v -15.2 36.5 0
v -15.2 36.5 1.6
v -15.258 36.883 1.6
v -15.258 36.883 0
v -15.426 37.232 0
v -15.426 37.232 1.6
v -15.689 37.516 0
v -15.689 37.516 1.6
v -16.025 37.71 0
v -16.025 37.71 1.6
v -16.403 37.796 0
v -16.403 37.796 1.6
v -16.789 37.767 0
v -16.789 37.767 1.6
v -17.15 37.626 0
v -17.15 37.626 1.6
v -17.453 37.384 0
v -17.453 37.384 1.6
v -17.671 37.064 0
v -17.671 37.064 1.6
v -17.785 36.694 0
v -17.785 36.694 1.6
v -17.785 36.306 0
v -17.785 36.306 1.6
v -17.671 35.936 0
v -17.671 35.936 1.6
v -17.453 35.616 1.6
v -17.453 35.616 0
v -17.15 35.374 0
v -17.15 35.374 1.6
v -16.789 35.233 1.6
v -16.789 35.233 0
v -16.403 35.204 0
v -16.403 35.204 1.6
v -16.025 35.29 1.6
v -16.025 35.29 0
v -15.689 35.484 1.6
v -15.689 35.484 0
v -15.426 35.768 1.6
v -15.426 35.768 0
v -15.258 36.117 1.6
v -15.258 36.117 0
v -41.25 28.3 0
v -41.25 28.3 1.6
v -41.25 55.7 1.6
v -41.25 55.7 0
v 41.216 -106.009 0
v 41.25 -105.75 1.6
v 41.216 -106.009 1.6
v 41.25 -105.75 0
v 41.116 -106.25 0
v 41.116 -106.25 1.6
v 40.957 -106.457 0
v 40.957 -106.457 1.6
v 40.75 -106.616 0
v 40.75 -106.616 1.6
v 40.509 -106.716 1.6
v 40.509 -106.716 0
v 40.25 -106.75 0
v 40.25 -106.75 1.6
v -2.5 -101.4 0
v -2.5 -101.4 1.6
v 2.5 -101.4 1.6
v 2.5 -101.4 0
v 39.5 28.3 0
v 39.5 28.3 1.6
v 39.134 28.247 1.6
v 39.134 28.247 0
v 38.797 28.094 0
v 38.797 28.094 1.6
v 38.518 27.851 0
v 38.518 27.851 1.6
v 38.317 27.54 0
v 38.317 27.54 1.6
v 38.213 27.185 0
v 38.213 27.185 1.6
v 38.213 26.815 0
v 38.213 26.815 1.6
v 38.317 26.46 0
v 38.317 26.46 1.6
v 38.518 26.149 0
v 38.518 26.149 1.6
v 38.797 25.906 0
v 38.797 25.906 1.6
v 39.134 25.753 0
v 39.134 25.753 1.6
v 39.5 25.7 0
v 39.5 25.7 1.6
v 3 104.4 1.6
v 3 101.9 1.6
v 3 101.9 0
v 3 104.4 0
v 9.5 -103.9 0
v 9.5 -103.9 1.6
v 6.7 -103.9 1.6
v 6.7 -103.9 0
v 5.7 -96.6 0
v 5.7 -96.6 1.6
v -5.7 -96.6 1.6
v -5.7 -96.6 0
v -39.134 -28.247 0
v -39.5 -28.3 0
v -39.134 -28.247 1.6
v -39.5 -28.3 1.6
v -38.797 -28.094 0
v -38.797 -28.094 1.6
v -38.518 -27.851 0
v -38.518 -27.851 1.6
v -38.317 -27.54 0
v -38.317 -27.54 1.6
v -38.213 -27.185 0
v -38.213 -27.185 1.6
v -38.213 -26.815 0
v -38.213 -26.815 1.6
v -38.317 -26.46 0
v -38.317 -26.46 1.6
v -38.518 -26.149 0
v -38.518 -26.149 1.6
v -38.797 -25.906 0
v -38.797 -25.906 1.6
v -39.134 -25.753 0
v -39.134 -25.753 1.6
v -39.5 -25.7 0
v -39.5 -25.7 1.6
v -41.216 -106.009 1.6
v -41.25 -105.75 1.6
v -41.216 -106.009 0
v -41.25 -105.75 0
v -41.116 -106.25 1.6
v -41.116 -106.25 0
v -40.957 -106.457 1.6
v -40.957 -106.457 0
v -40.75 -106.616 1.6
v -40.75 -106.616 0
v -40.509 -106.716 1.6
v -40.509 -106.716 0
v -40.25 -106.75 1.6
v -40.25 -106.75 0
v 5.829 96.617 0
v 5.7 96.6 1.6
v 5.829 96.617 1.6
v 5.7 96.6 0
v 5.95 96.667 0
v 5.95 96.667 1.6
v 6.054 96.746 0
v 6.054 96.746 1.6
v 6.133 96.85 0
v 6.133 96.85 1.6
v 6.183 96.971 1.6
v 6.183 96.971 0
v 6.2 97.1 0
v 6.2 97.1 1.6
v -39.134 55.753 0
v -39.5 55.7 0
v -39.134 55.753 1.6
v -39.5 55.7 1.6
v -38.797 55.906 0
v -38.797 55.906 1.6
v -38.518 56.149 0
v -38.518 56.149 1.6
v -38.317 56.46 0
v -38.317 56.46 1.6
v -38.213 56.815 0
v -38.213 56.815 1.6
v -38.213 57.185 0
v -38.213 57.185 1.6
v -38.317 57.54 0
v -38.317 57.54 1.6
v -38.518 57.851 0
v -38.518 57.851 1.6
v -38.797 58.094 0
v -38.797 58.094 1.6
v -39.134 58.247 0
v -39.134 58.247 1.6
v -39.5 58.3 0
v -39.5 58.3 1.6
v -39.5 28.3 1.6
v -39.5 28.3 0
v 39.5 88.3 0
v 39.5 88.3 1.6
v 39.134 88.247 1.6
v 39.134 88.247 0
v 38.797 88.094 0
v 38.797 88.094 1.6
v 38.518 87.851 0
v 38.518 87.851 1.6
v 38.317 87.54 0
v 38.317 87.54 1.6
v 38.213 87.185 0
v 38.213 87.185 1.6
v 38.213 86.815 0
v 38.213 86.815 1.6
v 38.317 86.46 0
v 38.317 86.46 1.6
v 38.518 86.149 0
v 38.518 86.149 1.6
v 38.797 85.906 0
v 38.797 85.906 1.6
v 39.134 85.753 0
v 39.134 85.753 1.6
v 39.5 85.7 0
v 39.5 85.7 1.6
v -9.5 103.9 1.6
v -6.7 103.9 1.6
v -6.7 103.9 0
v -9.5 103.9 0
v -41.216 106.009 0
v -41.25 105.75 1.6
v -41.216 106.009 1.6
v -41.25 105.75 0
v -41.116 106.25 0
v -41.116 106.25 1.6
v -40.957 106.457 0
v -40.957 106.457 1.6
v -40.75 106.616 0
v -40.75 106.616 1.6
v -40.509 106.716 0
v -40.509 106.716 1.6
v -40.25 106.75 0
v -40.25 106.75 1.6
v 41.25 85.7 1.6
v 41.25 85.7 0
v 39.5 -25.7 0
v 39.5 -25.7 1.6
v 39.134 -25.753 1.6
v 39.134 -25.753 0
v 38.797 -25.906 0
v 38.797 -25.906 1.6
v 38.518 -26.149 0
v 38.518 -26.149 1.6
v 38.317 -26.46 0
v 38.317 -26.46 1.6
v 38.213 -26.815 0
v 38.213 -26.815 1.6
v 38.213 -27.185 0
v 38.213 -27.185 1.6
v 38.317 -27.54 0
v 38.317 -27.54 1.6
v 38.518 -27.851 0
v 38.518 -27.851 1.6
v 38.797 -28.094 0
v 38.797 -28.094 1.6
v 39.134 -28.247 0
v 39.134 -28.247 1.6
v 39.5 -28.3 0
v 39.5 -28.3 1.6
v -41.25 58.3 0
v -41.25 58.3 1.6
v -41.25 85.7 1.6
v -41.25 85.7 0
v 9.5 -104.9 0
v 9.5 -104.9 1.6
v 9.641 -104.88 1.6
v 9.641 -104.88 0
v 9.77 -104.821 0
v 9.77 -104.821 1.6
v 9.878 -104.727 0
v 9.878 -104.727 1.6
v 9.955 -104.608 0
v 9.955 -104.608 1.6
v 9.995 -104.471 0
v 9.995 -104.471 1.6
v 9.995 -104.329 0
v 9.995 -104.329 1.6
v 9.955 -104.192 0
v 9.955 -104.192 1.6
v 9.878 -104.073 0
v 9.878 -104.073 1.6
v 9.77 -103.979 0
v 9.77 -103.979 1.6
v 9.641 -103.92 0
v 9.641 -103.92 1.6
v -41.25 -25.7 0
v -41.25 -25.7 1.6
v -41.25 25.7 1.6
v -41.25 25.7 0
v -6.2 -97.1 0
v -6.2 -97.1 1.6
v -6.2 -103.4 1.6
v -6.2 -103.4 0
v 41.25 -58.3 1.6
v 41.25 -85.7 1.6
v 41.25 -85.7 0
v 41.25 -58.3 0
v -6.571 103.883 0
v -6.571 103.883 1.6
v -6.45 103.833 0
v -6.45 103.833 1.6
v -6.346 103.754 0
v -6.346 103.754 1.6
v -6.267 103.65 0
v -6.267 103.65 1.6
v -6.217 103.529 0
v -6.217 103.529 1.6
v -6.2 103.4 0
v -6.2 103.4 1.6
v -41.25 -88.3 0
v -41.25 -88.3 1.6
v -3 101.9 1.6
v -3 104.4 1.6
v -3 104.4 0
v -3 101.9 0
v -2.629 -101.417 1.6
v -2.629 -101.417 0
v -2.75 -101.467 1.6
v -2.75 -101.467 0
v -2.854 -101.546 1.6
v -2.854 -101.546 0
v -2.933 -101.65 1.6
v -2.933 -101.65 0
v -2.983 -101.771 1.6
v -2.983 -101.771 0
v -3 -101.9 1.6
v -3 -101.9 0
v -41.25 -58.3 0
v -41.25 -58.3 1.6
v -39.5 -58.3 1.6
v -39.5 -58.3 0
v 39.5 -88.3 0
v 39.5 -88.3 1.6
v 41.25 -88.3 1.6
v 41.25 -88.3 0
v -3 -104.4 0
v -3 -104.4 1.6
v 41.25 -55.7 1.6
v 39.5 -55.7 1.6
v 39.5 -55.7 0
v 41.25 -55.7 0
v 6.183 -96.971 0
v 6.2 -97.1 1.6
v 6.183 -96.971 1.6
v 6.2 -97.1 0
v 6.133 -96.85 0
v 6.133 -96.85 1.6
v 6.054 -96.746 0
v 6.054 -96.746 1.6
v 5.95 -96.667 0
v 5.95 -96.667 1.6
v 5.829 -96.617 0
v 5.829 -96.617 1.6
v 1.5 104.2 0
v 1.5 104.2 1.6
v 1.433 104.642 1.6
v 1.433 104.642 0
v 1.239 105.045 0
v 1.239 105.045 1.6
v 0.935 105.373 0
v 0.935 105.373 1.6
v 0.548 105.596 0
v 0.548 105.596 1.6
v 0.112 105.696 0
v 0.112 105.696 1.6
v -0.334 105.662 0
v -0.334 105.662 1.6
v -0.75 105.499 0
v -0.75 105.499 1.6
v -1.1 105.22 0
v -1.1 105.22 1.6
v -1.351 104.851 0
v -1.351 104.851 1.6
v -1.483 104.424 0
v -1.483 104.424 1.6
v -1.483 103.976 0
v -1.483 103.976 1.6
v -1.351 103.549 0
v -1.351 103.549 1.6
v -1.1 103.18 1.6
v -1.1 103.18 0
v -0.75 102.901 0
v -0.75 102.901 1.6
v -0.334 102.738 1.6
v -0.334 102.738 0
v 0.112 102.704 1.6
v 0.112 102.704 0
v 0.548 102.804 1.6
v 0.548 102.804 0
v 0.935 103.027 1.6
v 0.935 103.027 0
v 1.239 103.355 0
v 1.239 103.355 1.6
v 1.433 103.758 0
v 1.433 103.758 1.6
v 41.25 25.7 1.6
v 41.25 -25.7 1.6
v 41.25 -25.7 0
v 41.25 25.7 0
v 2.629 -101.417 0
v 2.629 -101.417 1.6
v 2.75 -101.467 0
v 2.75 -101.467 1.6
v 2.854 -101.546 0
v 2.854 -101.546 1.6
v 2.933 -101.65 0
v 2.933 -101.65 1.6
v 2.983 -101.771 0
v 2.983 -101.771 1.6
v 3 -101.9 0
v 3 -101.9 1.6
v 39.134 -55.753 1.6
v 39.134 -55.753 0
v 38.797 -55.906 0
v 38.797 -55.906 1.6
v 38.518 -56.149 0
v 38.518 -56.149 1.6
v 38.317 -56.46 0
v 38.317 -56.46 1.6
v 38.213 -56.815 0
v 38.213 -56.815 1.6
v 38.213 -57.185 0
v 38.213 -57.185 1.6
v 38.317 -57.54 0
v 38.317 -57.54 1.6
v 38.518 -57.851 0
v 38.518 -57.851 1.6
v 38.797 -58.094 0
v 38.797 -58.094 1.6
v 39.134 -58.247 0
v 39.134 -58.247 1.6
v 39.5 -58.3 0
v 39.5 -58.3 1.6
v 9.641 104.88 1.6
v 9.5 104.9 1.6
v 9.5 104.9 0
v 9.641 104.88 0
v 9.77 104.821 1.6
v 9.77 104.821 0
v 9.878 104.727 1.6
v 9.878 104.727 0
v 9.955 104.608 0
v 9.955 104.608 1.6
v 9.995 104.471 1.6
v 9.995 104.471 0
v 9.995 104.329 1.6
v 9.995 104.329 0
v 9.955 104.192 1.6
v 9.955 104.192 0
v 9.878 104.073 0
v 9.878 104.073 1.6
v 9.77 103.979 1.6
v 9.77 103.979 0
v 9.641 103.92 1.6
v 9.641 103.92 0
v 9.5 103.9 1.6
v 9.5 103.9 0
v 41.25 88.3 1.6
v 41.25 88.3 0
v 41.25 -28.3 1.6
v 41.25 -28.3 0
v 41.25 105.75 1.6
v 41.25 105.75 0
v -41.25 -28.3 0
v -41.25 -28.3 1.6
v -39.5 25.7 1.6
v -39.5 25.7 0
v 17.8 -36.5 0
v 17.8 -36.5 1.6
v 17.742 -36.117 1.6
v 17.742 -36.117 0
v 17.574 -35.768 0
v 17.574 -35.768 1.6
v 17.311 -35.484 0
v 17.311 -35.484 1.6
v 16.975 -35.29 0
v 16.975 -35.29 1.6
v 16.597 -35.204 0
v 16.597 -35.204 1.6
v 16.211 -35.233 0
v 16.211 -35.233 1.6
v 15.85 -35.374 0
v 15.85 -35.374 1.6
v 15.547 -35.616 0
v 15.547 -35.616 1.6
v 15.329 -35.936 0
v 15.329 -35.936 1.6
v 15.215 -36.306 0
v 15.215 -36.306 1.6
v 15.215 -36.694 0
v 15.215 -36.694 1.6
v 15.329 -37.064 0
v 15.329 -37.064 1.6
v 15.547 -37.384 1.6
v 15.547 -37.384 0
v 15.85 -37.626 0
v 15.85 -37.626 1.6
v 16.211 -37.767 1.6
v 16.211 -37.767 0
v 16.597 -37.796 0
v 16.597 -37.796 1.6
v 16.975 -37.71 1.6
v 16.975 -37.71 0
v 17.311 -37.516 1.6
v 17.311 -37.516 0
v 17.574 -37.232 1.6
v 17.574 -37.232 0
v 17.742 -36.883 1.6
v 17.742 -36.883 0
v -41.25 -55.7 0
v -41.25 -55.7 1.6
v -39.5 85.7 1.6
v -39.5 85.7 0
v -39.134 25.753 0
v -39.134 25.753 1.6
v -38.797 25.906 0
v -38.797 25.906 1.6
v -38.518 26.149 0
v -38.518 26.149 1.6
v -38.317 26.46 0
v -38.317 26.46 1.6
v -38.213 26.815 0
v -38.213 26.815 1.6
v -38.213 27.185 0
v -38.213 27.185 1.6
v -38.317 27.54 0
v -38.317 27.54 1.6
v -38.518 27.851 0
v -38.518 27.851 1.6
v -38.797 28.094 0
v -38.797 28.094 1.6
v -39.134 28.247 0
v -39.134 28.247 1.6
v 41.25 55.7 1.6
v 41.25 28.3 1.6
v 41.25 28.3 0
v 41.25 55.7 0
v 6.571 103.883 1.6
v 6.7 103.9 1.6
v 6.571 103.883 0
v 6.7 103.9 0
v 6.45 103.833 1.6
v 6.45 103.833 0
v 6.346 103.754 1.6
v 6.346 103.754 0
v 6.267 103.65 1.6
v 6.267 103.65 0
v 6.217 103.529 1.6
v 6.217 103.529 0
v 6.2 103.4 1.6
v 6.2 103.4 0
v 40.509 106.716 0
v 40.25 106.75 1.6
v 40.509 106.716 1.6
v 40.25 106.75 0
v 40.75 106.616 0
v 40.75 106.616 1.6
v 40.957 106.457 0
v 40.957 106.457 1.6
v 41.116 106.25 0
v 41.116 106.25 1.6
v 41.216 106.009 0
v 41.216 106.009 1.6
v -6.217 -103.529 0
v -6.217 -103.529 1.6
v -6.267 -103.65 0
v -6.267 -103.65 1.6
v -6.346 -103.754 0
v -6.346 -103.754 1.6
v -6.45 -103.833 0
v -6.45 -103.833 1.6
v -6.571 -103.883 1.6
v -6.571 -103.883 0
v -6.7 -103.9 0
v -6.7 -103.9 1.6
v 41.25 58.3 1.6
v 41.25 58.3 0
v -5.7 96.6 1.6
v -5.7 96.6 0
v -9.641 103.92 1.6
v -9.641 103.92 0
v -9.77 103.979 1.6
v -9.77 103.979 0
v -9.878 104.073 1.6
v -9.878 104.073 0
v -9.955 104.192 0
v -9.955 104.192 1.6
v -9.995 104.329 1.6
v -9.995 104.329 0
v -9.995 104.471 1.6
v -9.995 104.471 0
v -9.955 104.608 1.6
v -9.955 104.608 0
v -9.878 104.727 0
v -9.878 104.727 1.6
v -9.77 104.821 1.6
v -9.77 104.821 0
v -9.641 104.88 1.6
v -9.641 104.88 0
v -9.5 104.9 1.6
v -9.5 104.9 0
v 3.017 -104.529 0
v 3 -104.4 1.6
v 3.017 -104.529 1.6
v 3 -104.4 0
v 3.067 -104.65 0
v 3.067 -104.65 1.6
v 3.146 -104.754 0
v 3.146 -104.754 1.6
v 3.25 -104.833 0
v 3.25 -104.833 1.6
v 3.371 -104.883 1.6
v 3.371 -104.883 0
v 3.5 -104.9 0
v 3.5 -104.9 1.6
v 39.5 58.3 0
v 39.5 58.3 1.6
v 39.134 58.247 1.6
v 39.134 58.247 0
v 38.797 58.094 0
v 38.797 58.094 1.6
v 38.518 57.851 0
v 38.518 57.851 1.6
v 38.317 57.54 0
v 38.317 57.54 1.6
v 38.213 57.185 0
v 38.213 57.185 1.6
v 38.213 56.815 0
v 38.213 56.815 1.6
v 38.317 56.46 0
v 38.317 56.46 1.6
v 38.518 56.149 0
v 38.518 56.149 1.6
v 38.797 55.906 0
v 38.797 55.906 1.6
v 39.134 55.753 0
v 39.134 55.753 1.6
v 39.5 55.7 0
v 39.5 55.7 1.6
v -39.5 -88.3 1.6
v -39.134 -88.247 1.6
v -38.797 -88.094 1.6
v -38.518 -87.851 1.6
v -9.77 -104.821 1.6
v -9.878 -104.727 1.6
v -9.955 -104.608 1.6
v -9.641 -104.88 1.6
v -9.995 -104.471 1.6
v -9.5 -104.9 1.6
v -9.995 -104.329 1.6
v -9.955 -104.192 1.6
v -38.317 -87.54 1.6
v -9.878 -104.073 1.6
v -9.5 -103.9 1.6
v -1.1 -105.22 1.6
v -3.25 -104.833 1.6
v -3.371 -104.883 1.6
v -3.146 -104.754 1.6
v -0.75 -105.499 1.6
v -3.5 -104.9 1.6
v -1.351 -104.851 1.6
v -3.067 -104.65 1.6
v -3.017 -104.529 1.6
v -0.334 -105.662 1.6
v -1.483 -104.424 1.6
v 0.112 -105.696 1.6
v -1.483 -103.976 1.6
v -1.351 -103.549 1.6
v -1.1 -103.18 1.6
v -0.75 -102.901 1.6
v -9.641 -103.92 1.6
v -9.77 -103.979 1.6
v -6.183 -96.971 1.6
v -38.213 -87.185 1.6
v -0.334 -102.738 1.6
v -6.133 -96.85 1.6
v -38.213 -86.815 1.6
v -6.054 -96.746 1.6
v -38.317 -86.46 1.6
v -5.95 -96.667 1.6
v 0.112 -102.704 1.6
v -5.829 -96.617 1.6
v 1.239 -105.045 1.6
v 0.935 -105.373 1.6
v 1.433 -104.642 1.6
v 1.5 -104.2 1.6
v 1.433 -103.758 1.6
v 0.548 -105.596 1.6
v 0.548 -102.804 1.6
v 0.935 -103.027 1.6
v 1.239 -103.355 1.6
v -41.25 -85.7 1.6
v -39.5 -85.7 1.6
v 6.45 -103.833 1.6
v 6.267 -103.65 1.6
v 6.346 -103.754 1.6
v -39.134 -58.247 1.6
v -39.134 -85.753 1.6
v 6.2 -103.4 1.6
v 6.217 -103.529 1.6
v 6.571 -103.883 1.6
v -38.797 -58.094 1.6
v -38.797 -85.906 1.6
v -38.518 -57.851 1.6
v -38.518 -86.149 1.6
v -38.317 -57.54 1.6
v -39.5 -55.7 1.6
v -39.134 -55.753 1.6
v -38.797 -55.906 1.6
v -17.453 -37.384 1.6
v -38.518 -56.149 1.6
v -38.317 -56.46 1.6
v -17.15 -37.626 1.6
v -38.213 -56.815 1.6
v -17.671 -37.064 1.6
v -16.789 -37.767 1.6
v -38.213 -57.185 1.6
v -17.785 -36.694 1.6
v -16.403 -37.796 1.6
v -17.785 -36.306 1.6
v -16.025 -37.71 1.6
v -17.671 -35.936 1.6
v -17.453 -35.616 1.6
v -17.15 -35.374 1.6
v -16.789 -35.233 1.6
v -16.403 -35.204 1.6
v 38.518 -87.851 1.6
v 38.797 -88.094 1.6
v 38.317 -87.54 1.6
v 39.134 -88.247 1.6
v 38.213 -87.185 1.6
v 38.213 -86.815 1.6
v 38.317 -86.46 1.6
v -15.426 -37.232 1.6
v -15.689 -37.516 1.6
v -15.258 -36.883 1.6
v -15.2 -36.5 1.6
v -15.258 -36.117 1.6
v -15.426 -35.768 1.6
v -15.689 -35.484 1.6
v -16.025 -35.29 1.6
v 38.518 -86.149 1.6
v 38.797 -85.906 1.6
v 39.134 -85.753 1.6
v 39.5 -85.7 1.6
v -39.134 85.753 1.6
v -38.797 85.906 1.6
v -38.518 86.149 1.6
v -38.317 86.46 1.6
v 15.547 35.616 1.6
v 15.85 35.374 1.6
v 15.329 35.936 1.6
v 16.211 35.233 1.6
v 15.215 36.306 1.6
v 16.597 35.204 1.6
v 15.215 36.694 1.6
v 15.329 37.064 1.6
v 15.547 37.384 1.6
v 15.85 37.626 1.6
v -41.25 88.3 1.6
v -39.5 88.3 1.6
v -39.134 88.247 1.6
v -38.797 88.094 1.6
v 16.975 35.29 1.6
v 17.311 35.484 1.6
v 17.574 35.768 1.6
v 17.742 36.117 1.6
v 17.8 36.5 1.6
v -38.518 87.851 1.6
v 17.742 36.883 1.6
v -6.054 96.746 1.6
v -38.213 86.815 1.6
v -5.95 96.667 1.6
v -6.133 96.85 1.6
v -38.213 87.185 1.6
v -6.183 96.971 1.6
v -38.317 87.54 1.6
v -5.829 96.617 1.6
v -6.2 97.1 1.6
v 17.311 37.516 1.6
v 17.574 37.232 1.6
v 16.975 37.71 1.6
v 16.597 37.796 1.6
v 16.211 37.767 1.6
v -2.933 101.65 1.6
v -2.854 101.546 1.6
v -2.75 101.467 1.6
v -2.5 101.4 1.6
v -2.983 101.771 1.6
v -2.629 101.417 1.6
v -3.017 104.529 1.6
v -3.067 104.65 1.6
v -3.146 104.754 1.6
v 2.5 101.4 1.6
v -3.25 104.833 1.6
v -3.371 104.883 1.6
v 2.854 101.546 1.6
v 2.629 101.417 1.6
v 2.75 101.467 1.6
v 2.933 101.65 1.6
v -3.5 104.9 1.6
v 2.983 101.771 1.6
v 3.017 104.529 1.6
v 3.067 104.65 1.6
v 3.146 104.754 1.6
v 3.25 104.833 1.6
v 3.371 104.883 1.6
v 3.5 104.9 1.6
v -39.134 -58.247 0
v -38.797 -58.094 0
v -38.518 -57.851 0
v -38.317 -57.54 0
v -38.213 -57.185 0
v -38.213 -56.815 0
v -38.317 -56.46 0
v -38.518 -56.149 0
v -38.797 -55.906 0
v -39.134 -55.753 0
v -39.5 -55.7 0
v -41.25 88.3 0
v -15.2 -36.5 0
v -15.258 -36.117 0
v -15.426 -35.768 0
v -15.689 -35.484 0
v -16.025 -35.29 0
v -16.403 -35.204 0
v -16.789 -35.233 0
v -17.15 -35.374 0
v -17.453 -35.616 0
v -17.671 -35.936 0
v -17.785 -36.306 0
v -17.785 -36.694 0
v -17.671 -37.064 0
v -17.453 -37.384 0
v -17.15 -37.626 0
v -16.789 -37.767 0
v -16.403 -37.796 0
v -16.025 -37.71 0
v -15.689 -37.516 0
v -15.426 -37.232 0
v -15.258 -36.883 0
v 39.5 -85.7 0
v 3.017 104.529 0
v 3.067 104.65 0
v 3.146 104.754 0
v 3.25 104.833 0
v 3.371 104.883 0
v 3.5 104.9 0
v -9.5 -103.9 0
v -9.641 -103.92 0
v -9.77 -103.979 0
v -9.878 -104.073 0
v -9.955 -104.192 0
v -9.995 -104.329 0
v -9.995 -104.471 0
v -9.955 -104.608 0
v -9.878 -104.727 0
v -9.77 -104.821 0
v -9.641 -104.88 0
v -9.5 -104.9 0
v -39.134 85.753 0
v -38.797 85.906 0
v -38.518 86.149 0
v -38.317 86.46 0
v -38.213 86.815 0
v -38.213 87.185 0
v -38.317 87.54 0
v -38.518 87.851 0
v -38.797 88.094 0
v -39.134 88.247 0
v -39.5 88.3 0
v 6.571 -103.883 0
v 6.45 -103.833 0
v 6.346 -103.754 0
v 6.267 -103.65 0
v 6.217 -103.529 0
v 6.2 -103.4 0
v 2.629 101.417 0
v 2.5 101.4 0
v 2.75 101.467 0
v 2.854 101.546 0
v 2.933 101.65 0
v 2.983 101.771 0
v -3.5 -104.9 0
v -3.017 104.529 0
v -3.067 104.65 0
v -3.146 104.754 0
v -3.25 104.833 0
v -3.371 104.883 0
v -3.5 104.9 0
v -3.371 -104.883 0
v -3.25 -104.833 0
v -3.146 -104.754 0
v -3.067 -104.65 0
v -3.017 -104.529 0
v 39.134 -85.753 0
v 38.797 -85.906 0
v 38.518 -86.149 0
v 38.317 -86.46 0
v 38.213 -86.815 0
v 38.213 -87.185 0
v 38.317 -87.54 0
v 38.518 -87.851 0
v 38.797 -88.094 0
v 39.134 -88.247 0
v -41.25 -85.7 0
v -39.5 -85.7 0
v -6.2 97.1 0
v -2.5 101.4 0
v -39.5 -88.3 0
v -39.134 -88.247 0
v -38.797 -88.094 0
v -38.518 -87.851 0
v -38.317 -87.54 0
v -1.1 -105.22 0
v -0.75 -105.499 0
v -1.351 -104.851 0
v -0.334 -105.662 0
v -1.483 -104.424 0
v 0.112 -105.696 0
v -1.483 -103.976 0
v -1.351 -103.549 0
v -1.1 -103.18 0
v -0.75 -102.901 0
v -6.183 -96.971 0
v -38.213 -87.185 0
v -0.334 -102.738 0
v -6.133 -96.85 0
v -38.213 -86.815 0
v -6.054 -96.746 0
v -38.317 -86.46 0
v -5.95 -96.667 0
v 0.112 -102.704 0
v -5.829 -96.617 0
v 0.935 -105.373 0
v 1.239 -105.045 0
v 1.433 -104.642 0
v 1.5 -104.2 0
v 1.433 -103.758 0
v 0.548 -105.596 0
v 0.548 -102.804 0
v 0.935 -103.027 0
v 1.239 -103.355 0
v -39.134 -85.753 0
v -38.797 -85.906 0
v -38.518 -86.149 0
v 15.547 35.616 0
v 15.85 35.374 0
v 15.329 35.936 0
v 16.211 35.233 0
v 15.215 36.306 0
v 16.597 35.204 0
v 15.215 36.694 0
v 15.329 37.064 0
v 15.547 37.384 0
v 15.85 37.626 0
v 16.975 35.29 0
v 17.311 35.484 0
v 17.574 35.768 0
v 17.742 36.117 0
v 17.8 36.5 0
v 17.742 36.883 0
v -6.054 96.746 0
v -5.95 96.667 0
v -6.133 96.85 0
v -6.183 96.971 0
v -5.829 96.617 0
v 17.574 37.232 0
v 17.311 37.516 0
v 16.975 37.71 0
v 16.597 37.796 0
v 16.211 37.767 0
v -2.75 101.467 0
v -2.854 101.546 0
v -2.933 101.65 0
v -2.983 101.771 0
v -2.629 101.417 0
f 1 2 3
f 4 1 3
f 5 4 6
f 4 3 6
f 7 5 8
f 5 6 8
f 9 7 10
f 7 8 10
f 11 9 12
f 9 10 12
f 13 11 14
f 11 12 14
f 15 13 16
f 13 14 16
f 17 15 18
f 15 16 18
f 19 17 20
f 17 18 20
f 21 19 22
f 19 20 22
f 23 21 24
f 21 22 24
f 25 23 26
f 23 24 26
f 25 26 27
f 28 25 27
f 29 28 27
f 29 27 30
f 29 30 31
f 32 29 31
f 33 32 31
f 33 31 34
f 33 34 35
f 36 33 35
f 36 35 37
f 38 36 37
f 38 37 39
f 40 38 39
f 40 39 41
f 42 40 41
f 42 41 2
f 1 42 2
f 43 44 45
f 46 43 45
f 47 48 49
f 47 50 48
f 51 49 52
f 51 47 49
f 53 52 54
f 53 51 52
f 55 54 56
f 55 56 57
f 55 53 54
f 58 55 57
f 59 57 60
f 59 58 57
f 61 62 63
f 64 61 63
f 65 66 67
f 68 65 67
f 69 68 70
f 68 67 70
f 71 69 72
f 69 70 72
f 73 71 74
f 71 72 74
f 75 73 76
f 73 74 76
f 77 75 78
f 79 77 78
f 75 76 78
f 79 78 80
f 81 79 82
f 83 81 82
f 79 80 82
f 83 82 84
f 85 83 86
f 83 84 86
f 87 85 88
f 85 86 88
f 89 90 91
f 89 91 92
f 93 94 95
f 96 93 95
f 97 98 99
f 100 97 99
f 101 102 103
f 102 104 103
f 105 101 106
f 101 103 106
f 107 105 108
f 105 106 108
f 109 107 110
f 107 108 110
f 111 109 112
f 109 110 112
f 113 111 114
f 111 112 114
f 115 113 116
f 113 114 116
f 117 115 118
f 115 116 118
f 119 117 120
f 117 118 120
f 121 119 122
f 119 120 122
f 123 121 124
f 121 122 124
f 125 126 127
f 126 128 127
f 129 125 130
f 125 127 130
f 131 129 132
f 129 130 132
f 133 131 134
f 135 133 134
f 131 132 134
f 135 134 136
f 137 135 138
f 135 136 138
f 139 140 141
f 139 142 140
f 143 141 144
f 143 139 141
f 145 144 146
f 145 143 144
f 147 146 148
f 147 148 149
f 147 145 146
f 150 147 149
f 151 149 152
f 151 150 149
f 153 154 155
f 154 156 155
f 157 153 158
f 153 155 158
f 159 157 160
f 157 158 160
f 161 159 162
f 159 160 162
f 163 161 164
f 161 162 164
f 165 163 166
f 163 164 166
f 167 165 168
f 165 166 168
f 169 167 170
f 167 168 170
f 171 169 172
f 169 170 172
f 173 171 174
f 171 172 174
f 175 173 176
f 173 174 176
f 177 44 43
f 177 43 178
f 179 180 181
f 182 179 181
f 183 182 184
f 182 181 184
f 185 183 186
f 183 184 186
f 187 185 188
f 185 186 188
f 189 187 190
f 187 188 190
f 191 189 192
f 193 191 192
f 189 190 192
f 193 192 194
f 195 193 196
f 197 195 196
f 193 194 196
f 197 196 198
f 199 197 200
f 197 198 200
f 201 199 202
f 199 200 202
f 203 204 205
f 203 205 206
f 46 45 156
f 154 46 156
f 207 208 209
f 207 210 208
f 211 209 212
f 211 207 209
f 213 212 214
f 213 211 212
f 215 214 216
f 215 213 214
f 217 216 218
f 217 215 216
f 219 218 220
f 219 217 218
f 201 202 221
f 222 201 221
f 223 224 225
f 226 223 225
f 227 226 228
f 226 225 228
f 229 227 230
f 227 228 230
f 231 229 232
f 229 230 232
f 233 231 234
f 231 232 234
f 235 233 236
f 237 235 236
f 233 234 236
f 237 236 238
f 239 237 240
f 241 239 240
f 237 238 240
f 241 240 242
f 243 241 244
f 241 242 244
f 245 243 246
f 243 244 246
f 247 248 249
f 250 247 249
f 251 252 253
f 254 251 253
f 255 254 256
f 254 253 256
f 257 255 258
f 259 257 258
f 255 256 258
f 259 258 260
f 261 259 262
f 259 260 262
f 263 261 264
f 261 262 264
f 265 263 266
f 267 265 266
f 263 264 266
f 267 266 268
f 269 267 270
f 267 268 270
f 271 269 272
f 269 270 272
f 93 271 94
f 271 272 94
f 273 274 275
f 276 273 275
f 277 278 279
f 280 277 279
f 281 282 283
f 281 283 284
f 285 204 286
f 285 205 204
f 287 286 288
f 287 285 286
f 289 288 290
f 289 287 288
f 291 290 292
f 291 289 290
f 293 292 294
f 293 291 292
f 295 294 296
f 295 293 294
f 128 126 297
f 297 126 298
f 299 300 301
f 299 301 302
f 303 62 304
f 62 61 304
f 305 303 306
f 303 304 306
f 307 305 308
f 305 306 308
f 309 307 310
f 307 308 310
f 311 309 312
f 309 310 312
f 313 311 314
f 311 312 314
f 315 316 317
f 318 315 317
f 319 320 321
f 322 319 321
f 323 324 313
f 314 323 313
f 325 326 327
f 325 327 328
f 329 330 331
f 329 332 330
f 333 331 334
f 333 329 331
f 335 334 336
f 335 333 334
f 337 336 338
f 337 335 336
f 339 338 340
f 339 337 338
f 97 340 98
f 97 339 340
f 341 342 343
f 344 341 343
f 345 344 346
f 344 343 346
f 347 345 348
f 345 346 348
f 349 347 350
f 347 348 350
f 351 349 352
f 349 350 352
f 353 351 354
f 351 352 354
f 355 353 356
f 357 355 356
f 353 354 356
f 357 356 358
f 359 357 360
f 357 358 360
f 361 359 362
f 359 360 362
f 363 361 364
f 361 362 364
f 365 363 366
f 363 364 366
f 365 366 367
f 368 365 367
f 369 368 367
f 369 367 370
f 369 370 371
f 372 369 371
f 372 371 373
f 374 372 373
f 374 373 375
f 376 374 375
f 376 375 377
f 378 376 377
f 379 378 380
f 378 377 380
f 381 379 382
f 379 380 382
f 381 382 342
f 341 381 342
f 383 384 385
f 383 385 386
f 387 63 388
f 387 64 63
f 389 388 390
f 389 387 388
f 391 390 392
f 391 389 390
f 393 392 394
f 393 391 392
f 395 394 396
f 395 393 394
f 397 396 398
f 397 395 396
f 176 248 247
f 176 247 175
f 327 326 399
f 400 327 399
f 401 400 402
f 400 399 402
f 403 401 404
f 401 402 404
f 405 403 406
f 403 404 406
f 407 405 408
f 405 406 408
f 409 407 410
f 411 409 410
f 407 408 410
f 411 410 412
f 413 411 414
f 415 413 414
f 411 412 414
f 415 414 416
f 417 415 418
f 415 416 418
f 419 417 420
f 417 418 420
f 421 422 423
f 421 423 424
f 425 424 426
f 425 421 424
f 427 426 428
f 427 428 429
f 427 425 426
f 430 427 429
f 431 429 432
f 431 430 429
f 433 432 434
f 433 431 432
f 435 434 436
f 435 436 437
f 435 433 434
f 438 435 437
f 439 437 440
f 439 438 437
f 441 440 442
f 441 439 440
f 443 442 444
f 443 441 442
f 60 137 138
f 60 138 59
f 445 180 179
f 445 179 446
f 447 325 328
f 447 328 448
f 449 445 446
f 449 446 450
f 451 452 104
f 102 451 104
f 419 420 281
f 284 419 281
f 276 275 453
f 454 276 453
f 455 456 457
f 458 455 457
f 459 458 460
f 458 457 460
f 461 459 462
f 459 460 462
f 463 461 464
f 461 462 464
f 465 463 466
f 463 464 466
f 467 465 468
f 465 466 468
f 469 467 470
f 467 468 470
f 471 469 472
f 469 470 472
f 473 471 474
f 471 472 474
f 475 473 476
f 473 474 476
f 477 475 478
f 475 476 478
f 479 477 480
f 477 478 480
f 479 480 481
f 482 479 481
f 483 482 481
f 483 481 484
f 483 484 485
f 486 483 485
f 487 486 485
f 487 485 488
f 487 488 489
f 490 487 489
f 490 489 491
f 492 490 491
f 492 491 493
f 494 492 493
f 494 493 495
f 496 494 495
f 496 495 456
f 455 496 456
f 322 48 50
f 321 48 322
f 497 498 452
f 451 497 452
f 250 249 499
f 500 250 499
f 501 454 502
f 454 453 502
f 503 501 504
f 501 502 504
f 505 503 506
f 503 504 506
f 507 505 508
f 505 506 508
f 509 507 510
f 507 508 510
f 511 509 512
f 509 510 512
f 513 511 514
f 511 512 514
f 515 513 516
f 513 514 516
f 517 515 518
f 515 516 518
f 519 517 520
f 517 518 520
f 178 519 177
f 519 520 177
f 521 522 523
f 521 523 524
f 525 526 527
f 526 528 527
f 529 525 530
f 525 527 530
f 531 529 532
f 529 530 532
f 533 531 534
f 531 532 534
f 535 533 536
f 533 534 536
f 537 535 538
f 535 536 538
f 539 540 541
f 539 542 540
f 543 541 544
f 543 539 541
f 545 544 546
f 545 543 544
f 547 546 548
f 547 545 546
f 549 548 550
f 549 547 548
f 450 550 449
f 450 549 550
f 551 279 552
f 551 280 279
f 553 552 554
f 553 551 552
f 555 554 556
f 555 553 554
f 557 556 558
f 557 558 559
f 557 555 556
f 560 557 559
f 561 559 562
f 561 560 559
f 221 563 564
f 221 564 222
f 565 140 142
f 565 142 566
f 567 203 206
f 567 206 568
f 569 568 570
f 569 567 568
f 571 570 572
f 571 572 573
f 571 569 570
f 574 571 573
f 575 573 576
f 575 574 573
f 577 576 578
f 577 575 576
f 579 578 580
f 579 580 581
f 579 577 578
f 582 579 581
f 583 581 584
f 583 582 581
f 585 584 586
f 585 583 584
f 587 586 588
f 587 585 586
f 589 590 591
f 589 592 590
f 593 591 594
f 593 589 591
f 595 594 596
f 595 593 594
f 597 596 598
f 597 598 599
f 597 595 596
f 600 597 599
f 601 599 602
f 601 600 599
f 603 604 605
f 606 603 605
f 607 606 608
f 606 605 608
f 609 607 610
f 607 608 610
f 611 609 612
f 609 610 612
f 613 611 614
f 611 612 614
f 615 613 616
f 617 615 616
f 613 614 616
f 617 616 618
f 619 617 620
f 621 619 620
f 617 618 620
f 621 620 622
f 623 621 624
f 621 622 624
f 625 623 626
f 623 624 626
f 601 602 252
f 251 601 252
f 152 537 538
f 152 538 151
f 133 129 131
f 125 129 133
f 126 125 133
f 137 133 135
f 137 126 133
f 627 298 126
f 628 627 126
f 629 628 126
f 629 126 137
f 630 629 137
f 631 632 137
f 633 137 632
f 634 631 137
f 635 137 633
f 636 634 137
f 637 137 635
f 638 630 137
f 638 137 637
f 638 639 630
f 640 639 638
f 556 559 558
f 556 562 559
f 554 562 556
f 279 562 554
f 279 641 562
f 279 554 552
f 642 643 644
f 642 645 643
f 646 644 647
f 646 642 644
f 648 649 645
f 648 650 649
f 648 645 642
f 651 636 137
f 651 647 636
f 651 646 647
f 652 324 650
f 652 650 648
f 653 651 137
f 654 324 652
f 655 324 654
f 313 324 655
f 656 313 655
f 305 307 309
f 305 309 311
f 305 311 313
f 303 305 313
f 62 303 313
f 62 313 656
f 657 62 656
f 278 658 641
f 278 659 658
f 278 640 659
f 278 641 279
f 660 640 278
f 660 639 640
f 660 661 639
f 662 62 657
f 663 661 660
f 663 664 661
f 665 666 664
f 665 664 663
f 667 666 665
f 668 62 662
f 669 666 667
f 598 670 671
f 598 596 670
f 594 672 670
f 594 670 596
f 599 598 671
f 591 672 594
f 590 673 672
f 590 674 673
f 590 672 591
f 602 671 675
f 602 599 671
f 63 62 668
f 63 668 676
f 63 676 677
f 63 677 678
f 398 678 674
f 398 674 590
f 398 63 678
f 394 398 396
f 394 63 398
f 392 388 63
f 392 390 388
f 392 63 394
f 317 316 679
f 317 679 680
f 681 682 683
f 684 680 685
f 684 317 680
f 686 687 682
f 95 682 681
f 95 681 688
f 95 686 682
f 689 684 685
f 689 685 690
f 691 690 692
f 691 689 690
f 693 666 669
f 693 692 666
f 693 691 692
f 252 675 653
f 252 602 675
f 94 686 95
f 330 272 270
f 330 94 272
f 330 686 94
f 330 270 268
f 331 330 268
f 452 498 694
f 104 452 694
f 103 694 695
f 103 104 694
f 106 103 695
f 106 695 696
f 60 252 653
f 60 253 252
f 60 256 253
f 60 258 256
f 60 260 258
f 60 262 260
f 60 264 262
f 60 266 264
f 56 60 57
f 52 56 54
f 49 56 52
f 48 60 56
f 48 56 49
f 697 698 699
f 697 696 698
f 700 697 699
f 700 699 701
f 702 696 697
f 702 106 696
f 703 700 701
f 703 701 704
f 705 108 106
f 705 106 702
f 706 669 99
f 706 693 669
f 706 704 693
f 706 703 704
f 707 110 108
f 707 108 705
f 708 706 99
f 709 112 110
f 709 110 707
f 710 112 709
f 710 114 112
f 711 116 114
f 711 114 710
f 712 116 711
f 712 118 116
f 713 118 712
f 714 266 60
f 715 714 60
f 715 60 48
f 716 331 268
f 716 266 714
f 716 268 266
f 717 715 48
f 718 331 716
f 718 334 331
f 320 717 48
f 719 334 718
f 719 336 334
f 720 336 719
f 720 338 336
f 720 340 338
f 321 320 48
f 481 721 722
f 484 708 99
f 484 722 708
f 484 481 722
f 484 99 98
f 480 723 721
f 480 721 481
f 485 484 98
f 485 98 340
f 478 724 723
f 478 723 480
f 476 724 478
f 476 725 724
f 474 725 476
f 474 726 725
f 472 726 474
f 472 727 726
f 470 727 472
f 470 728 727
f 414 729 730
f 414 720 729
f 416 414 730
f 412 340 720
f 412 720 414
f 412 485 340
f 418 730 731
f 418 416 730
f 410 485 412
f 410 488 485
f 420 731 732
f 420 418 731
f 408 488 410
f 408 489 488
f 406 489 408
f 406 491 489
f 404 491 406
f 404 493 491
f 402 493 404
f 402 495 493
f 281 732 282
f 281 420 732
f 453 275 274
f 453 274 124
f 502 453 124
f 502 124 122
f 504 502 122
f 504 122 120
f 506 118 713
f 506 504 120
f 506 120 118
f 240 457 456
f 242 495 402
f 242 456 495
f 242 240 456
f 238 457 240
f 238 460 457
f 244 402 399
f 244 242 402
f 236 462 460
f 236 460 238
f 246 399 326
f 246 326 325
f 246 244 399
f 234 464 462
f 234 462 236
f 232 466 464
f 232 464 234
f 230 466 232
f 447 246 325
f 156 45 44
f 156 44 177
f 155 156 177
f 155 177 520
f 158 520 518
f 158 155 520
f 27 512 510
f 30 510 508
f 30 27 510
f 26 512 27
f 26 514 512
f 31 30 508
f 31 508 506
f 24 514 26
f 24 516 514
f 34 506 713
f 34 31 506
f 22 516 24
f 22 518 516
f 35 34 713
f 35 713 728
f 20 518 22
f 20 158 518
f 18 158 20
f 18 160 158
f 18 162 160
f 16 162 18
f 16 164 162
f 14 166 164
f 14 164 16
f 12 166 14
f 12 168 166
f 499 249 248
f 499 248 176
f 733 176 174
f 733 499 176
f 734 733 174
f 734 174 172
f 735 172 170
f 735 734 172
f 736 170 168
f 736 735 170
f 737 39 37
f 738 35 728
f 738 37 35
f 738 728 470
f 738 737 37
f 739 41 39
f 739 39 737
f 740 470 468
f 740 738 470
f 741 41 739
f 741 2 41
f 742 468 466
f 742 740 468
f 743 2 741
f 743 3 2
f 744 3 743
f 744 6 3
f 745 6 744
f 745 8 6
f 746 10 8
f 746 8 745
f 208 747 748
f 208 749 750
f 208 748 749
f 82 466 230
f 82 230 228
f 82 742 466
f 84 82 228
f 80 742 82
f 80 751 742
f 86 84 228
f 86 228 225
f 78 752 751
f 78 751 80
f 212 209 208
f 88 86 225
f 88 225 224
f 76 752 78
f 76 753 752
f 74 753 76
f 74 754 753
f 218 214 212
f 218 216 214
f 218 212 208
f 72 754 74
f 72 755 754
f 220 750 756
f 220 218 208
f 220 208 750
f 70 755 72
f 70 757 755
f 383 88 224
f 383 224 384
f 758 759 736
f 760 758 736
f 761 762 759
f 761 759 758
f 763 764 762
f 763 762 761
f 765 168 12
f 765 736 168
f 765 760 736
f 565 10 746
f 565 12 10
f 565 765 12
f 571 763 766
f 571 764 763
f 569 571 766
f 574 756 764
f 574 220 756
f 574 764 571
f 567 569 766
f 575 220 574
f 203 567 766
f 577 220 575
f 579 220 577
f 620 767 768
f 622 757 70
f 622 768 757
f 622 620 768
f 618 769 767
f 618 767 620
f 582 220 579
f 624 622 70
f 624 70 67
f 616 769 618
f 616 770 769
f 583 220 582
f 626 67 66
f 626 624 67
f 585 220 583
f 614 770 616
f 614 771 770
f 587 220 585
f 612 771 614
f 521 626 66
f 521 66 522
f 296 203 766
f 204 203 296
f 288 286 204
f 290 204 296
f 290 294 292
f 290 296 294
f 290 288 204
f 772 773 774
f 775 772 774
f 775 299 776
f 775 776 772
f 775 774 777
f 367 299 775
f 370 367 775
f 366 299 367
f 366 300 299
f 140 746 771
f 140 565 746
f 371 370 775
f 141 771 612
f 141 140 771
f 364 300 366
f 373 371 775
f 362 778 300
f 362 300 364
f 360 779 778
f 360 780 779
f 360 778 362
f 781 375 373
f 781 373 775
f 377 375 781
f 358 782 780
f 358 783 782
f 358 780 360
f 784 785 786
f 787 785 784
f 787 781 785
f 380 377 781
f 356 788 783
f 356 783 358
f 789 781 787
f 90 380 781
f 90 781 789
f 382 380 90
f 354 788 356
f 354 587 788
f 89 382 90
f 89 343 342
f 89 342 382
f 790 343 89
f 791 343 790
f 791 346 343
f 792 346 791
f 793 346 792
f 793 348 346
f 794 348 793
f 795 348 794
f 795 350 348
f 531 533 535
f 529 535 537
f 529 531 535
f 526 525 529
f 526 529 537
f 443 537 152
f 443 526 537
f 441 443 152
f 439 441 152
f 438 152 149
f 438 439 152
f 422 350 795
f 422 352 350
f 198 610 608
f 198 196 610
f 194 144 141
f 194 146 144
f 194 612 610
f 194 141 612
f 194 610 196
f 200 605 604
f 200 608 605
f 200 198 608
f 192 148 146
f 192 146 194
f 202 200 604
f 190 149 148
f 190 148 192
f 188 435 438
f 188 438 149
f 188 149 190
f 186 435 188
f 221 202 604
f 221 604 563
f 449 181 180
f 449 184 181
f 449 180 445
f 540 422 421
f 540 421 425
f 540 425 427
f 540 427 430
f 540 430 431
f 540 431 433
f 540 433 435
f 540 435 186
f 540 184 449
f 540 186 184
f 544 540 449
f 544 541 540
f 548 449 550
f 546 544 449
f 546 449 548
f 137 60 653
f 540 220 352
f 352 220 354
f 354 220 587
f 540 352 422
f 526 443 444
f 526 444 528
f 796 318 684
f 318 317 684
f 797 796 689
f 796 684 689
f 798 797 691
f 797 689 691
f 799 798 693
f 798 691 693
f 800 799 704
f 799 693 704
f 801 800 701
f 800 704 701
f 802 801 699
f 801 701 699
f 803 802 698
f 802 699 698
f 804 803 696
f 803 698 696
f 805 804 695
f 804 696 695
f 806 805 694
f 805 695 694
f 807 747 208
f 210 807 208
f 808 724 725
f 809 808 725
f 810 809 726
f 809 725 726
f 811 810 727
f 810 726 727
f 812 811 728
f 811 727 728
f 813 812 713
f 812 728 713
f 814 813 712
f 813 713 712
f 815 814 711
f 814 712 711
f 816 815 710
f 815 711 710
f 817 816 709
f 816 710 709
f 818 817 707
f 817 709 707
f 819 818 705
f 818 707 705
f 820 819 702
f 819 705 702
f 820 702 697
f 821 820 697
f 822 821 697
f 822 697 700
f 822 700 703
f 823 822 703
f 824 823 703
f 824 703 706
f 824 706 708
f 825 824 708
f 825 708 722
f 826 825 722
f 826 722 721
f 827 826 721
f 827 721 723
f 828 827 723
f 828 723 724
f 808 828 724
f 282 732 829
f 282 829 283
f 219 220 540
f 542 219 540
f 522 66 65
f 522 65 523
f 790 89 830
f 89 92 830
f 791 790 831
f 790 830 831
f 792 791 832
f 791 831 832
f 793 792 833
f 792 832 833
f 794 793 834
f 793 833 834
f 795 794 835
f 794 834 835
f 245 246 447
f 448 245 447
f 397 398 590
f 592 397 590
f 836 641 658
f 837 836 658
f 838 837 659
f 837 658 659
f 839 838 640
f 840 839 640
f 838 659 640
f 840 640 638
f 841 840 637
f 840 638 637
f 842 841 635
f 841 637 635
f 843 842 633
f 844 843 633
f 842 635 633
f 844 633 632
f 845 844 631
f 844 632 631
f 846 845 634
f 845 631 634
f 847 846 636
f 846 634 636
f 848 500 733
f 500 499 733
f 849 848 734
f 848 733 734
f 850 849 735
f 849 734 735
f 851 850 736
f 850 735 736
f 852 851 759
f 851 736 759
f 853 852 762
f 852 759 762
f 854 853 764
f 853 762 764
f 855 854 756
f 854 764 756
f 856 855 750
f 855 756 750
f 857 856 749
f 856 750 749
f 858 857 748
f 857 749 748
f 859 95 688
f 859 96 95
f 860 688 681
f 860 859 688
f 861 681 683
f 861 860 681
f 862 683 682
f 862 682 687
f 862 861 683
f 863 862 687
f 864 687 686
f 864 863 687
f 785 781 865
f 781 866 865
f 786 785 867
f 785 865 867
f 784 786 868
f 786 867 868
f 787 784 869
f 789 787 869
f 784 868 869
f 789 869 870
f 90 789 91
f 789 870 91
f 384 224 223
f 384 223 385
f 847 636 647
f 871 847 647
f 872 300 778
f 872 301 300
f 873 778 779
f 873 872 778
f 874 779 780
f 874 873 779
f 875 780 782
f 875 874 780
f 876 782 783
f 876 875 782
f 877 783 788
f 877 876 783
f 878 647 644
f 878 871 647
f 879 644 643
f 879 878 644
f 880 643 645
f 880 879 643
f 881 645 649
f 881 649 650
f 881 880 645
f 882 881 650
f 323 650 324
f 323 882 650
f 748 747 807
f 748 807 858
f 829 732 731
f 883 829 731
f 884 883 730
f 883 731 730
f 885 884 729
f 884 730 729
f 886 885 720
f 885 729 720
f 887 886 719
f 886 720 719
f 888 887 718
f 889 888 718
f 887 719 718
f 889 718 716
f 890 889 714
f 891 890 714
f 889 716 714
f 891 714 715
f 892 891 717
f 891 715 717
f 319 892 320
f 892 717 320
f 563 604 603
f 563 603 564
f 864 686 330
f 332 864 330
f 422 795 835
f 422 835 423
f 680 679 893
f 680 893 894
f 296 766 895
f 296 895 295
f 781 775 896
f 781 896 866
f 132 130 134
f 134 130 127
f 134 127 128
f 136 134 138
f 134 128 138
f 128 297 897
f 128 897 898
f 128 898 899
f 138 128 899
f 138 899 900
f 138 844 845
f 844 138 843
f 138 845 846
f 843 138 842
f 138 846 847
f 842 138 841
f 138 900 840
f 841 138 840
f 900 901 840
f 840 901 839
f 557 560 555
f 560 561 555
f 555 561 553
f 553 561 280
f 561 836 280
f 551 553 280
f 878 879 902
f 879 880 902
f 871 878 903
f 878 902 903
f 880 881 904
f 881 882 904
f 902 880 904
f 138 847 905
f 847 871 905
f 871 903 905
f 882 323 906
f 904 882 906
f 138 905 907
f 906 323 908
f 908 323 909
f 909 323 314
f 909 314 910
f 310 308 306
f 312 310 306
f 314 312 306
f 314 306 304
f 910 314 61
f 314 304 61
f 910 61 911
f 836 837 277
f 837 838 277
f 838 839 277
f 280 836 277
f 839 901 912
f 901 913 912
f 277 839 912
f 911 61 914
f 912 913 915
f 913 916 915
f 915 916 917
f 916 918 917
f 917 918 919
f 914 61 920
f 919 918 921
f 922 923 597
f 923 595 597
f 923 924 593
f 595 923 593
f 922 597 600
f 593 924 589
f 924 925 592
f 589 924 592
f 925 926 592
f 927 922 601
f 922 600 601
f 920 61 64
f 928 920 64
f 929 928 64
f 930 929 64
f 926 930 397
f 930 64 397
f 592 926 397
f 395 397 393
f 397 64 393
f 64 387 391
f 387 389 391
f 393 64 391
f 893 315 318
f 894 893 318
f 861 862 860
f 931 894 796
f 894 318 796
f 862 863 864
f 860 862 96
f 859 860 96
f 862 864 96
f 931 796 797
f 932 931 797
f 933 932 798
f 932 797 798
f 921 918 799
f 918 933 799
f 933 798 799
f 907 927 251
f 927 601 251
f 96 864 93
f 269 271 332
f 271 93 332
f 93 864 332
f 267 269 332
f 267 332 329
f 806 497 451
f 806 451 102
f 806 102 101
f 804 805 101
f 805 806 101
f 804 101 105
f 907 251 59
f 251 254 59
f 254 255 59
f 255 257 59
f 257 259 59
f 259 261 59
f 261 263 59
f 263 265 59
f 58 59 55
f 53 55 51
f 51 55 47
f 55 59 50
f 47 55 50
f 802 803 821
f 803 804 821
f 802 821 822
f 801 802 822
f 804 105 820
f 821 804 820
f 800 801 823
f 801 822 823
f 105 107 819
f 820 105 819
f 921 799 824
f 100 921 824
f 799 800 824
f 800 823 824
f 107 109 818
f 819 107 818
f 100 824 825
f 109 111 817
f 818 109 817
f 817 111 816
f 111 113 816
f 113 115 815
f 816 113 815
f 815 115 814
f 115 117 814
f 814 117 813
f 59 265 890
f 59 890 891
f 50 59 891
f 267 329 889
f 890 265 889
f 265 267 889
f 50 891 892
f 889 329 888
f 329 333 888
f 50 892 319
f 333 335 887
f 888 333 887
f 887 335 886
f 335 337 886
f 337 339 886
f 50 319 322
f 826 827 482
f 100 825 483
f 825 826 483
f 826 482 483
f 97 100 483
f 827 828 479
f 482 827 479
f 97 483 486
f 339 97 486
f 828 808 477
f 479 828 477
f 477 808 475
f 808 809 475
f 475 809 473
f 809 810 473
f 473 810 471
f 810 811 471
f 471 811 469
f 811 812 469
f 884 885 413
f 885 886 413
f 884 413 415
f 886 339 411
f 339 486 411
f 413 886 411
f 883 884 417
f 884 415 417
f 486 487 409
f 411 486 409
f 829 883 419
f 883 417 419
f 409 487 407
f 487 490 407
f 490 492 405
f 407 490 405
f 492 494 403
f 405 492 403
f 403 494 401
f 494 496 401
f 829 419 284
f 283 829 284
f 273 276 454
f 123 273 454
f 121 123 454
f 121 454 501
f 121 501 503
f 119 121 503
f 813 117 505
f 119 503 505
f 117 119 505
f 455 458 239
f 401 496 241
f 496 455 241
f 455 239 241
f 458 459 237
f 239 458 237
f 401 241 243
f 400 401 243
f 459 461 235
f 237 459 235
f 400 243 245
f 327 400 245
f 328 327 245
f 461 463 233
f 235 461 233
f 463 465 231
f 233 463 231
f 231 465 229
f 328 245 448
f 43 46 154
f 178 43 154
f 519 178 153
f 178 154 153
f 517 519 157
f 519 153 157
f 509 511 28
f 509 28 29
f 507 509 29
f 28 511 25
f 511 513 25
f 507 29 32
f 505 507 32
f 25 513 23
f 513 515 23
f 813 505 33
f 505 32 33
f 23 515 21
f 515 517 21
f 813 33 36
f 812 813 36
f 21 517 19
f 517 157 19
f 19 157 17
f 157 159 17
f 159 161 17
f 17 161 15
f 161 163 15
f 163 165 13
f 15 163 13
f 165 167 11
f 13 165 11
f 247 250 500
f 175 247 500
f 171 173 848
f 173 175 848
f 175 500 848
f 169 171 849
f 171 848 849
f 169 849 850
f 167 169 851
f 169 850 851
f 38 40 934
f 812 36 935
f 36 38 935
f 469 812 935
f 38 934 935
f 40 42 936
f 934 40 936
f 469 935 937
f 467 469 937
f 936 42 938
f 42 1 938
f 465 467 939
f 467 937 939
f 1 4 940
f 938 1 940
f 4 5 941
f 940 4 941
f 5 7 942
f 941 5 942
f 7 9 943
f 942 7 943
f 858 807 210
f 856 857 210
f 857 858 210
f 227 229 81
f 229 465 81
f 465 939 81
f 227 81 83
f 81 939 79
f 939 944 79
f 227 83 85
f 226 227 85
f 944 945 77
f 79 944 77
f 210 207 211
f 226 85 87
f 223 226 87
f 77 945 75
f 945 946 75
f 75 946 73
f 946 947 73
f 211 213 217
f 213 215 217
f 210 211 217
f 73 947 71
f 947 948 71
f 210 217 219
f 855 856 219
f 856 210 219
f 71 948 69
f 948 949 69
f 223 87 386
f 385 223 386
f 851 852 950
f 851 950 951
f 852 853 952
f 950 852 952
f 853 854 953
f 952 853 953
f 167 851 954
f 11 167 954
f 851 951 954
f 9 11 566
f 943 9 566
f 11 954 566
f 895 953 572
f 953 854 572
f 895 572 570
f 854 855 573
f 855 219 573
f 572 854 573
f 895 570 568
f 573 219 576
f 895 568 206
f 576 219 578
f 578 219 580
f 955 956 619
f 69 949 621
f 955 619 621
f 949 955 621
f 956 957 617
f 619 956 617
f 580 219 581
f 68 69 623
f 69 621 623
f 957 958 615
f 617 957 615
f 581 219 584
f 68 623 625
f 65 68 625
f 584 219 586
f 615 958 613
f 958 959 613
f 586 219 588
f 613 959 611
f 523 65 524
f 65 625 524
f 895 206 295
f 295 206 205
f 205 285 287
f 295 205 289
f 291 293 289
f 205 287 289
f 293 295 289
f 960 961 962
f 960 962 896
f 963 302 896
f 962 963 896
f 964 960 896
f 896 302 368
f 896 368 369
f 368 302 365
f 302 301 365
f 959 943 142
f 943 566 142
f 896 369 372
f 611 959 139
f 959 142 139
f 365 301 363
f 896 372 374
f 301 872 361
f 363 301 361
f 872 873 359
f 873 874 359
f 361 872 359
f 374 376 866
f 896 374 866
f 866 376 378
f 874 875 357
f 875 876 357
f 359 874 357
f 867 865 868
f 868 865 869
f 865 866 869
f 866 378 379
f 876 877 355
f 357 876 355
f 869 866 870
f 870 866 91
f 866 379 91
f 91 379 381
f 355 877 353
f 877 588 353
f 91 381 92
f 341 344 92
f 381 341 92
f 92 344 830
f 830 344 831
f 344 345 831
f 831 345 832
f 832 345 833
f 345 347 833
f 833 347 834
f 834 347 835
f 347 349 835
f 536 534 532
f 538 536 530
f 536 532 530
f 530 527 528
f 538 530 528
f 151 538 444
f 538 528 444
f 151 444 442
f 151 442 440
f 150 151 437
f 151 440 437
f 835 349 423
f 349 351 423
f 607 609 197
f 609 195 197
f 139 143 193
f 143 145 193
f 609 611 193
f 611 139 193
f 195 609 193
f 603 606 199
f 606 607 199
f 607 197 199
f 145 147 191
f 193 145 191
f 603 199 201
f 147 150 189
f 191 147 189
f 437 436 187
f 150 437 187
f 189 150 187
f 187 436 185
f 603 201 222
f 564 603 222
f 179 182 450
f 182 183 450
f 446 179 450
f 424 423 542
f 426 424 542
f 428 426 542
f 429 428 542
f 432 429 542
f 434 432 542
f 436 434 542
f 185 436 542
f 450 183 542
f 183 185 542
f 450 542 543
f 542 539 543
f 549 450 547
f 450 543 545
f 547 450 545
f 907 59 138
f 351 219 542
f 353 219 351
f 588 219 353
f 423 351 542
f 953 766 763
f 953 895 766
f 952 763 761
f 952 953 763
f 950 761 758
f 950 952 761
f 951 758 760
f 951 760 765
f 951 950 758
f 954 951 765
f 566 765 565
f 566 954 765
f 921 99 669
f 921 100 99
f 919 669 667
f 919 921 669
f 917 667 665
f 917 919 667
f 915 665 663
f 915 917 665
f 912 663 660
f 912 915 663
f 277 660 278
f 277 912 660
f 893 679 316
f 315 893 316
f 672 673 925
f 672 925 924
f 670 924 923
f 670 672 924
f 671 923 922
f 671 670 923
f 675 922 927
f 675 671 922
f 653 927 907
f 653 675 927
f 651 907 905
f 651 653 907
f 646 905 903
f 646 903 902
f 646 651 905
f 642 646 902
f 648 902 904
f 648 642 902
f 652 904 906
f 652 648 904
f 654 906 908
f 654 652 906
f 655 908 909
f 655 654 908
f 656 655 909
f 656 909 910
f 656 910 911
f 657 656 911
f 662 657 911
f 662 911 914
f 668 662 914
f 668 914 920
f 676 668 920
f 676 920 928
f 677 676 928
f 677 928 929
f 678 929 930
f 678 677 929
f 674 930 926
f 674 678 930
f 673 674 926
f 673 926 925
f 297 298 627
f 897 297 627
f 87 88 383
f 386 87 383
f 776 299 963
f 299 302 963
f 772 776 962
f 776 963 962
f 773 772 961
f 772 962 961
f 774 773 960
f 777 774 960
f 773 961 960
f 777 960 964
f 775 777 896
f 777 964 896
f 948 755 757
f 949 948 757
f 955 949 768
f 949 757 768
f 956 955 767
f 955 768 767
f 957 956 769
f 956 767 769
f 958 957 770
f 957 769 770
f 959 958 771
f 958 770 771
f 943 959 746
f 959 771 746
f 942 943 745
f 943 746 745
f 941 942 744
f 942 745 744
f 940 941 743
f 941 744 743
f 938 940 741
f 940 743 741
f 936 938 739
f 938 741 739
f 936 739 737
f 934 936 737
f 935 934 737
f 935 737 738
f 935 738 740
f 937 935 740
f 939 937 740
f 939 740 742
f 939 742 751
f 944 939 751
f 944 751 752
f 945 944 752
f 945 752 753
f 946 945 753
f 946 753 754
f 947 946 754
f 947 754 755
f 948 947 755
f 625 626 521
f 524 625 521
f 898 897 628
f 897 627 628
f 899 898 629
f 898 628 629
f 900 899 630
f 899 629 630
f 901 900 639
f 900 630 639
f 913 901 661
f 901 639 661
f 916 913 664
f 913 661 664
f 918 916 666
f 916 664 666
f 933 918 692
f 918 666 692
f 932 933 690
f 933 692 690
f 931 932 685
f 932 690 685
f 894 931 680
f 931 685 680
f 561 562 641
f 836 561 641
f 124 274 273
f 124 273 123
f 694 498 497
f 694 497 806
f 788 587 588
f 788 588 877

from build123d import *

# Parameters (mm, degrees)
SKETCH1_W                  = 82.8
SKETCH1_H                  = 213.8
SKETCH1_R                  = 0.8
PCB_EXTRUDE_DEPTH          = 1.6
SKETCH7_W                  = 82.5
SKETCH7_H                  = 213.5
OFFSET_EDGES_DEPTH         = 1.6
CORNER_FILLETS_ON_PCB_R    = 1
SKETCH3_R                  = 1.5
SOLAR_HOLE_DEPTH           = 1.6
FILLETS_FOR_SOLAR_HOLE_R   = 0.5
M2_CLEARANCE_HOLE1_D       = 2.6
SKETCH6_W                  = 1.75
SKETCH6_H                  = 2.6
SLOTS_FOR_EDGE_HOLES_DEPTH = 1.6


with BuildPart() as part:
    # Sketch1 → pcb extrude (new body)
    with BuildSketch(Plane.XY):
        Rectangle(SKETCH1_W, SKETCH1_H)
        with Locations((-39.5, -27)):
            Circle(SKETCH1_R, mode=Mode.SUBTRACT)
        with Locations((39.5, -27)):
            Circle(SKETCH1_R, mode=Mode.SUBTRACT)
        with Locations((-39.5, 87)):
            Circle(SKETCH1_R, mode=Mode.SUBTRACT)
        with Locations((-39.5, 57)):
            Circle(SKETCH1_R, mode=Mode.SUBTRACT)
        with Locations((-39.5, 27)):
            Circle(SKETCH1_R, mode=Mode.SUBTRACT)
        with Locations((-16.5, 36.5)):
            Circle(SKETCH1_R, mode=Mode.SUBTRACT)
        with Locations((-16.5, -36.5)):
            Circle(SKETCH1_R, mode=Mode.SUBTRACT)
        with Locations((-39.5, -57)):
            Circle(SKETCH1_R, mode=Mode.SUBTRACT)
        with Locations((-39.5, -87)):
            Circle(SKETCH1_R, mode=Mode.SUBTRACT)
        with Locations((0, -104.2)):
            Circle(SKETCH1_R, mode=Mode.SUBTRACT)
        with Locations((39.5, -87)):
            Circle(SKETCH1_R, mode=Mode.SUBTRACT)
        with Locations((39.5, -57)):
            Circle(SKETCH1_R, mode=Mode.SUBTRACT)
        with Locations((16.5, -36.5)):
            Circle(SKETCH1_R, mode=Mode.SUBTRACT)
        with Locations((39.5, 27)):
            Circle(SKETCH1_R, mode=Mode.SUBTRACT)
        with Locations((16.5, 36.5)):
            Circle(SKETCH1_R, mode=Mode.SUBTRACT)
        with Locations((39.5, 57)):
            Circle(SKETCH1_R, mode=Mode.SUBTRACT)
        with Locations((39.5, 87)):
            Circle(SKETCH1_R, mode=Mode.SUBTRACT)
        with Locations((0, 104.2)):
            Circle(SKETCH1_R, mode=Mode.SUBTRACT)
    extrude(amount=PCB_EXTRUDE_DEPTH)

    # Sketch7 → Offset Edges (cut)
    with BuildSketch(Plane.XY.offset(1.6)):
        Polygon((-41.25, 106.9), (-41.4, 106.9), (-41.4, -106.9), (-41.25, -106.9), (41.25, -106.9), (41.4, -106.9), (41.4, 106.9), (41.25, 106.9), align=None)
        Rectangle(SKETCH7_W, SKETCH7_H, mode=Mode.SUBTRACT)
    extrude(amount=-OFFSET_EDGES_DEPTH, mode=Mode.SUBTRACT)

    # corner fillets on PCB
    corner_fillets_on_pcb_edges = [part.edges().sort_by_distance(p)[0] for p in [
        (41.25, -106.75, 0.8),
        (41.25, 106.75, 0.8),
        (-41.25, 106.75, 0.8),
        (-41.25, -106.75, 0.8),
    ]]
    fillet(corner_fillets_on_pcb_edges, radius=CORNER_FILLETS_ON_PCB_R)

    # Sketch3 → Solar Hole (cut)
    with BuildSketch(Plane.XY.offset(1.6)):
        with Locations((0, 104.2)):
            Circle(SKETCH3_R)
        with BuildLine():
            Line((-3, 101.4), (3, 101.4))
            Line((3, 101.4), (3, 104.9))
            Line((3, 104.9), (9.5, 104.9))
            ThreePointArc((9.5, 104.9), (10, 104.4), (9.5, 103.9))
            Line((9.5, 103.9), (6.2, 103.9))
            Line((6.2, 103.9), (6.2, 96.6))
            Line((6.2, 96.6), (-6.2, 96.6))
            Line((-6.2, 96.6), (-6.2, 103.9))
            Line((-6.2, 103.9), (-9.5, 103.9))
            ThreePointArc((-9.5, 103.9), (-10, 104.4), (-9.5, 104.9))
            Line((-9.5, 104.9), (-3, 104.9))
            Line((-3, 104.9), (-3, 101.4))
        make_face()
    solar_hole = extrude(amount=-SOLAR_HOLE_DEPTH, mode=Mode.SUBTRACT)

    # Mirror solar hole: Solar Hole across plane
    add(solar_hole.mirror(Plane.ZX), mode=Mode.SUBTRACT)

    # fillets for solar hole
    fillets_for_solar_hole_edges = [part.edges().sort_by_distance(p)[0] for p in [
        (6.2, 103.9, 0.8),
        (6.2, 96.6, 0.8),
        (-6.2, 96.6, 0.8),
        (-6.2, 103.9, 0.8),
        (-3, 104.9, 0.8),
        (-3, 101.4, 0.8),
        (3, 101.4, 0.8),
        (3, 104.9, 0.8),
        (6.2, -103.9, 0.8),
        (6.2, -96.6, 0.8),
        (-6.2, -96.6, 0.8),
        (-6.2, -103.9, 0.8),
        (-3, -104.9, 0.8),
        (-3, -101.4, 0.8),
        (3, -101.4, 0.8),
        (3, -104.9, 0.8),
    ]]
    fillet(fillets_for_solar_hole_edges, radius=FILLETS_FOR_SOLAR_HOLE_R)

    # M2 Clearance Hole1 (through all)
    with Locations(Plane(origin=(0, 0, 0), x_dir=(-1, 0, 0), z_dir=(0, 0, -1))):
        with Locations((39.5, 87), (-39.5, 87), (16.5, 36.5), (-16.5, 36.5), (39.5, 57), (-39.5, 57), (39.5, 27), (-39.5, 27), (39.5, -57), (16.5, -36.5), (-16.5, -36.5), (-39.5, -57), (-39.5, -87), (39.5, -87), (39.5, -27), (-39.5, -27)):
            Hole(M2_CLEARANCE_HOLE1_D / 2)

    # Sketch6 → slots for edge holes (cut)
    with BuildSketch(Plane.XY.offset(1.6)):
        with Locations((-40.375, 87)):
            Rectangle(SKETCH6_W, SKETCH6_H)
        with Locations((40.375, 87)):
            Rectangle(SKETCH6_W, SKETCH6_H)
        with Locations((40.375, 57)):
            Rectangle(SKETCH6_W, SKETCH6_H)
        with Locations((40.375, 27)):
            Rectangle(SKETCH6_W, SKETCH6_H)
        with Locations((-40.375, 57)):
            Rectangle(SKETCH6_W, SKETCH6_H)
        with Locations((-40.375, 27)):
            Rectangle(SKETCH6_W, SKETCH6_H)
        with Locations((40.375, -87)):
            Rectangle(SKETCH6_W, SKETCH6_H)
        with Locations((-40.375, -87)):
            Rectangle(SKETCH6_W, SKETCH6_H)
        with Locations((40.375, -57)):
            Rectangle(SKETCH6_W, SKETCH6_H)
        with Locations((40.375, -27)):
            Rectangle(SKETCH6_W, SKETCH6_H)
        with Locations((-40.375, -57)):
            Rectangle(SKETCH6_W, SKETCH6_H)
        with Locations((-40.375, -27)):
            Rectangle(SKETCH6_W, SKETCH6_H)
    extrude(amount=-SLOTS_FOR_EDGE_HOLES_DEPTH, mode=Mode.SUBTRACT)


solid = part.part
